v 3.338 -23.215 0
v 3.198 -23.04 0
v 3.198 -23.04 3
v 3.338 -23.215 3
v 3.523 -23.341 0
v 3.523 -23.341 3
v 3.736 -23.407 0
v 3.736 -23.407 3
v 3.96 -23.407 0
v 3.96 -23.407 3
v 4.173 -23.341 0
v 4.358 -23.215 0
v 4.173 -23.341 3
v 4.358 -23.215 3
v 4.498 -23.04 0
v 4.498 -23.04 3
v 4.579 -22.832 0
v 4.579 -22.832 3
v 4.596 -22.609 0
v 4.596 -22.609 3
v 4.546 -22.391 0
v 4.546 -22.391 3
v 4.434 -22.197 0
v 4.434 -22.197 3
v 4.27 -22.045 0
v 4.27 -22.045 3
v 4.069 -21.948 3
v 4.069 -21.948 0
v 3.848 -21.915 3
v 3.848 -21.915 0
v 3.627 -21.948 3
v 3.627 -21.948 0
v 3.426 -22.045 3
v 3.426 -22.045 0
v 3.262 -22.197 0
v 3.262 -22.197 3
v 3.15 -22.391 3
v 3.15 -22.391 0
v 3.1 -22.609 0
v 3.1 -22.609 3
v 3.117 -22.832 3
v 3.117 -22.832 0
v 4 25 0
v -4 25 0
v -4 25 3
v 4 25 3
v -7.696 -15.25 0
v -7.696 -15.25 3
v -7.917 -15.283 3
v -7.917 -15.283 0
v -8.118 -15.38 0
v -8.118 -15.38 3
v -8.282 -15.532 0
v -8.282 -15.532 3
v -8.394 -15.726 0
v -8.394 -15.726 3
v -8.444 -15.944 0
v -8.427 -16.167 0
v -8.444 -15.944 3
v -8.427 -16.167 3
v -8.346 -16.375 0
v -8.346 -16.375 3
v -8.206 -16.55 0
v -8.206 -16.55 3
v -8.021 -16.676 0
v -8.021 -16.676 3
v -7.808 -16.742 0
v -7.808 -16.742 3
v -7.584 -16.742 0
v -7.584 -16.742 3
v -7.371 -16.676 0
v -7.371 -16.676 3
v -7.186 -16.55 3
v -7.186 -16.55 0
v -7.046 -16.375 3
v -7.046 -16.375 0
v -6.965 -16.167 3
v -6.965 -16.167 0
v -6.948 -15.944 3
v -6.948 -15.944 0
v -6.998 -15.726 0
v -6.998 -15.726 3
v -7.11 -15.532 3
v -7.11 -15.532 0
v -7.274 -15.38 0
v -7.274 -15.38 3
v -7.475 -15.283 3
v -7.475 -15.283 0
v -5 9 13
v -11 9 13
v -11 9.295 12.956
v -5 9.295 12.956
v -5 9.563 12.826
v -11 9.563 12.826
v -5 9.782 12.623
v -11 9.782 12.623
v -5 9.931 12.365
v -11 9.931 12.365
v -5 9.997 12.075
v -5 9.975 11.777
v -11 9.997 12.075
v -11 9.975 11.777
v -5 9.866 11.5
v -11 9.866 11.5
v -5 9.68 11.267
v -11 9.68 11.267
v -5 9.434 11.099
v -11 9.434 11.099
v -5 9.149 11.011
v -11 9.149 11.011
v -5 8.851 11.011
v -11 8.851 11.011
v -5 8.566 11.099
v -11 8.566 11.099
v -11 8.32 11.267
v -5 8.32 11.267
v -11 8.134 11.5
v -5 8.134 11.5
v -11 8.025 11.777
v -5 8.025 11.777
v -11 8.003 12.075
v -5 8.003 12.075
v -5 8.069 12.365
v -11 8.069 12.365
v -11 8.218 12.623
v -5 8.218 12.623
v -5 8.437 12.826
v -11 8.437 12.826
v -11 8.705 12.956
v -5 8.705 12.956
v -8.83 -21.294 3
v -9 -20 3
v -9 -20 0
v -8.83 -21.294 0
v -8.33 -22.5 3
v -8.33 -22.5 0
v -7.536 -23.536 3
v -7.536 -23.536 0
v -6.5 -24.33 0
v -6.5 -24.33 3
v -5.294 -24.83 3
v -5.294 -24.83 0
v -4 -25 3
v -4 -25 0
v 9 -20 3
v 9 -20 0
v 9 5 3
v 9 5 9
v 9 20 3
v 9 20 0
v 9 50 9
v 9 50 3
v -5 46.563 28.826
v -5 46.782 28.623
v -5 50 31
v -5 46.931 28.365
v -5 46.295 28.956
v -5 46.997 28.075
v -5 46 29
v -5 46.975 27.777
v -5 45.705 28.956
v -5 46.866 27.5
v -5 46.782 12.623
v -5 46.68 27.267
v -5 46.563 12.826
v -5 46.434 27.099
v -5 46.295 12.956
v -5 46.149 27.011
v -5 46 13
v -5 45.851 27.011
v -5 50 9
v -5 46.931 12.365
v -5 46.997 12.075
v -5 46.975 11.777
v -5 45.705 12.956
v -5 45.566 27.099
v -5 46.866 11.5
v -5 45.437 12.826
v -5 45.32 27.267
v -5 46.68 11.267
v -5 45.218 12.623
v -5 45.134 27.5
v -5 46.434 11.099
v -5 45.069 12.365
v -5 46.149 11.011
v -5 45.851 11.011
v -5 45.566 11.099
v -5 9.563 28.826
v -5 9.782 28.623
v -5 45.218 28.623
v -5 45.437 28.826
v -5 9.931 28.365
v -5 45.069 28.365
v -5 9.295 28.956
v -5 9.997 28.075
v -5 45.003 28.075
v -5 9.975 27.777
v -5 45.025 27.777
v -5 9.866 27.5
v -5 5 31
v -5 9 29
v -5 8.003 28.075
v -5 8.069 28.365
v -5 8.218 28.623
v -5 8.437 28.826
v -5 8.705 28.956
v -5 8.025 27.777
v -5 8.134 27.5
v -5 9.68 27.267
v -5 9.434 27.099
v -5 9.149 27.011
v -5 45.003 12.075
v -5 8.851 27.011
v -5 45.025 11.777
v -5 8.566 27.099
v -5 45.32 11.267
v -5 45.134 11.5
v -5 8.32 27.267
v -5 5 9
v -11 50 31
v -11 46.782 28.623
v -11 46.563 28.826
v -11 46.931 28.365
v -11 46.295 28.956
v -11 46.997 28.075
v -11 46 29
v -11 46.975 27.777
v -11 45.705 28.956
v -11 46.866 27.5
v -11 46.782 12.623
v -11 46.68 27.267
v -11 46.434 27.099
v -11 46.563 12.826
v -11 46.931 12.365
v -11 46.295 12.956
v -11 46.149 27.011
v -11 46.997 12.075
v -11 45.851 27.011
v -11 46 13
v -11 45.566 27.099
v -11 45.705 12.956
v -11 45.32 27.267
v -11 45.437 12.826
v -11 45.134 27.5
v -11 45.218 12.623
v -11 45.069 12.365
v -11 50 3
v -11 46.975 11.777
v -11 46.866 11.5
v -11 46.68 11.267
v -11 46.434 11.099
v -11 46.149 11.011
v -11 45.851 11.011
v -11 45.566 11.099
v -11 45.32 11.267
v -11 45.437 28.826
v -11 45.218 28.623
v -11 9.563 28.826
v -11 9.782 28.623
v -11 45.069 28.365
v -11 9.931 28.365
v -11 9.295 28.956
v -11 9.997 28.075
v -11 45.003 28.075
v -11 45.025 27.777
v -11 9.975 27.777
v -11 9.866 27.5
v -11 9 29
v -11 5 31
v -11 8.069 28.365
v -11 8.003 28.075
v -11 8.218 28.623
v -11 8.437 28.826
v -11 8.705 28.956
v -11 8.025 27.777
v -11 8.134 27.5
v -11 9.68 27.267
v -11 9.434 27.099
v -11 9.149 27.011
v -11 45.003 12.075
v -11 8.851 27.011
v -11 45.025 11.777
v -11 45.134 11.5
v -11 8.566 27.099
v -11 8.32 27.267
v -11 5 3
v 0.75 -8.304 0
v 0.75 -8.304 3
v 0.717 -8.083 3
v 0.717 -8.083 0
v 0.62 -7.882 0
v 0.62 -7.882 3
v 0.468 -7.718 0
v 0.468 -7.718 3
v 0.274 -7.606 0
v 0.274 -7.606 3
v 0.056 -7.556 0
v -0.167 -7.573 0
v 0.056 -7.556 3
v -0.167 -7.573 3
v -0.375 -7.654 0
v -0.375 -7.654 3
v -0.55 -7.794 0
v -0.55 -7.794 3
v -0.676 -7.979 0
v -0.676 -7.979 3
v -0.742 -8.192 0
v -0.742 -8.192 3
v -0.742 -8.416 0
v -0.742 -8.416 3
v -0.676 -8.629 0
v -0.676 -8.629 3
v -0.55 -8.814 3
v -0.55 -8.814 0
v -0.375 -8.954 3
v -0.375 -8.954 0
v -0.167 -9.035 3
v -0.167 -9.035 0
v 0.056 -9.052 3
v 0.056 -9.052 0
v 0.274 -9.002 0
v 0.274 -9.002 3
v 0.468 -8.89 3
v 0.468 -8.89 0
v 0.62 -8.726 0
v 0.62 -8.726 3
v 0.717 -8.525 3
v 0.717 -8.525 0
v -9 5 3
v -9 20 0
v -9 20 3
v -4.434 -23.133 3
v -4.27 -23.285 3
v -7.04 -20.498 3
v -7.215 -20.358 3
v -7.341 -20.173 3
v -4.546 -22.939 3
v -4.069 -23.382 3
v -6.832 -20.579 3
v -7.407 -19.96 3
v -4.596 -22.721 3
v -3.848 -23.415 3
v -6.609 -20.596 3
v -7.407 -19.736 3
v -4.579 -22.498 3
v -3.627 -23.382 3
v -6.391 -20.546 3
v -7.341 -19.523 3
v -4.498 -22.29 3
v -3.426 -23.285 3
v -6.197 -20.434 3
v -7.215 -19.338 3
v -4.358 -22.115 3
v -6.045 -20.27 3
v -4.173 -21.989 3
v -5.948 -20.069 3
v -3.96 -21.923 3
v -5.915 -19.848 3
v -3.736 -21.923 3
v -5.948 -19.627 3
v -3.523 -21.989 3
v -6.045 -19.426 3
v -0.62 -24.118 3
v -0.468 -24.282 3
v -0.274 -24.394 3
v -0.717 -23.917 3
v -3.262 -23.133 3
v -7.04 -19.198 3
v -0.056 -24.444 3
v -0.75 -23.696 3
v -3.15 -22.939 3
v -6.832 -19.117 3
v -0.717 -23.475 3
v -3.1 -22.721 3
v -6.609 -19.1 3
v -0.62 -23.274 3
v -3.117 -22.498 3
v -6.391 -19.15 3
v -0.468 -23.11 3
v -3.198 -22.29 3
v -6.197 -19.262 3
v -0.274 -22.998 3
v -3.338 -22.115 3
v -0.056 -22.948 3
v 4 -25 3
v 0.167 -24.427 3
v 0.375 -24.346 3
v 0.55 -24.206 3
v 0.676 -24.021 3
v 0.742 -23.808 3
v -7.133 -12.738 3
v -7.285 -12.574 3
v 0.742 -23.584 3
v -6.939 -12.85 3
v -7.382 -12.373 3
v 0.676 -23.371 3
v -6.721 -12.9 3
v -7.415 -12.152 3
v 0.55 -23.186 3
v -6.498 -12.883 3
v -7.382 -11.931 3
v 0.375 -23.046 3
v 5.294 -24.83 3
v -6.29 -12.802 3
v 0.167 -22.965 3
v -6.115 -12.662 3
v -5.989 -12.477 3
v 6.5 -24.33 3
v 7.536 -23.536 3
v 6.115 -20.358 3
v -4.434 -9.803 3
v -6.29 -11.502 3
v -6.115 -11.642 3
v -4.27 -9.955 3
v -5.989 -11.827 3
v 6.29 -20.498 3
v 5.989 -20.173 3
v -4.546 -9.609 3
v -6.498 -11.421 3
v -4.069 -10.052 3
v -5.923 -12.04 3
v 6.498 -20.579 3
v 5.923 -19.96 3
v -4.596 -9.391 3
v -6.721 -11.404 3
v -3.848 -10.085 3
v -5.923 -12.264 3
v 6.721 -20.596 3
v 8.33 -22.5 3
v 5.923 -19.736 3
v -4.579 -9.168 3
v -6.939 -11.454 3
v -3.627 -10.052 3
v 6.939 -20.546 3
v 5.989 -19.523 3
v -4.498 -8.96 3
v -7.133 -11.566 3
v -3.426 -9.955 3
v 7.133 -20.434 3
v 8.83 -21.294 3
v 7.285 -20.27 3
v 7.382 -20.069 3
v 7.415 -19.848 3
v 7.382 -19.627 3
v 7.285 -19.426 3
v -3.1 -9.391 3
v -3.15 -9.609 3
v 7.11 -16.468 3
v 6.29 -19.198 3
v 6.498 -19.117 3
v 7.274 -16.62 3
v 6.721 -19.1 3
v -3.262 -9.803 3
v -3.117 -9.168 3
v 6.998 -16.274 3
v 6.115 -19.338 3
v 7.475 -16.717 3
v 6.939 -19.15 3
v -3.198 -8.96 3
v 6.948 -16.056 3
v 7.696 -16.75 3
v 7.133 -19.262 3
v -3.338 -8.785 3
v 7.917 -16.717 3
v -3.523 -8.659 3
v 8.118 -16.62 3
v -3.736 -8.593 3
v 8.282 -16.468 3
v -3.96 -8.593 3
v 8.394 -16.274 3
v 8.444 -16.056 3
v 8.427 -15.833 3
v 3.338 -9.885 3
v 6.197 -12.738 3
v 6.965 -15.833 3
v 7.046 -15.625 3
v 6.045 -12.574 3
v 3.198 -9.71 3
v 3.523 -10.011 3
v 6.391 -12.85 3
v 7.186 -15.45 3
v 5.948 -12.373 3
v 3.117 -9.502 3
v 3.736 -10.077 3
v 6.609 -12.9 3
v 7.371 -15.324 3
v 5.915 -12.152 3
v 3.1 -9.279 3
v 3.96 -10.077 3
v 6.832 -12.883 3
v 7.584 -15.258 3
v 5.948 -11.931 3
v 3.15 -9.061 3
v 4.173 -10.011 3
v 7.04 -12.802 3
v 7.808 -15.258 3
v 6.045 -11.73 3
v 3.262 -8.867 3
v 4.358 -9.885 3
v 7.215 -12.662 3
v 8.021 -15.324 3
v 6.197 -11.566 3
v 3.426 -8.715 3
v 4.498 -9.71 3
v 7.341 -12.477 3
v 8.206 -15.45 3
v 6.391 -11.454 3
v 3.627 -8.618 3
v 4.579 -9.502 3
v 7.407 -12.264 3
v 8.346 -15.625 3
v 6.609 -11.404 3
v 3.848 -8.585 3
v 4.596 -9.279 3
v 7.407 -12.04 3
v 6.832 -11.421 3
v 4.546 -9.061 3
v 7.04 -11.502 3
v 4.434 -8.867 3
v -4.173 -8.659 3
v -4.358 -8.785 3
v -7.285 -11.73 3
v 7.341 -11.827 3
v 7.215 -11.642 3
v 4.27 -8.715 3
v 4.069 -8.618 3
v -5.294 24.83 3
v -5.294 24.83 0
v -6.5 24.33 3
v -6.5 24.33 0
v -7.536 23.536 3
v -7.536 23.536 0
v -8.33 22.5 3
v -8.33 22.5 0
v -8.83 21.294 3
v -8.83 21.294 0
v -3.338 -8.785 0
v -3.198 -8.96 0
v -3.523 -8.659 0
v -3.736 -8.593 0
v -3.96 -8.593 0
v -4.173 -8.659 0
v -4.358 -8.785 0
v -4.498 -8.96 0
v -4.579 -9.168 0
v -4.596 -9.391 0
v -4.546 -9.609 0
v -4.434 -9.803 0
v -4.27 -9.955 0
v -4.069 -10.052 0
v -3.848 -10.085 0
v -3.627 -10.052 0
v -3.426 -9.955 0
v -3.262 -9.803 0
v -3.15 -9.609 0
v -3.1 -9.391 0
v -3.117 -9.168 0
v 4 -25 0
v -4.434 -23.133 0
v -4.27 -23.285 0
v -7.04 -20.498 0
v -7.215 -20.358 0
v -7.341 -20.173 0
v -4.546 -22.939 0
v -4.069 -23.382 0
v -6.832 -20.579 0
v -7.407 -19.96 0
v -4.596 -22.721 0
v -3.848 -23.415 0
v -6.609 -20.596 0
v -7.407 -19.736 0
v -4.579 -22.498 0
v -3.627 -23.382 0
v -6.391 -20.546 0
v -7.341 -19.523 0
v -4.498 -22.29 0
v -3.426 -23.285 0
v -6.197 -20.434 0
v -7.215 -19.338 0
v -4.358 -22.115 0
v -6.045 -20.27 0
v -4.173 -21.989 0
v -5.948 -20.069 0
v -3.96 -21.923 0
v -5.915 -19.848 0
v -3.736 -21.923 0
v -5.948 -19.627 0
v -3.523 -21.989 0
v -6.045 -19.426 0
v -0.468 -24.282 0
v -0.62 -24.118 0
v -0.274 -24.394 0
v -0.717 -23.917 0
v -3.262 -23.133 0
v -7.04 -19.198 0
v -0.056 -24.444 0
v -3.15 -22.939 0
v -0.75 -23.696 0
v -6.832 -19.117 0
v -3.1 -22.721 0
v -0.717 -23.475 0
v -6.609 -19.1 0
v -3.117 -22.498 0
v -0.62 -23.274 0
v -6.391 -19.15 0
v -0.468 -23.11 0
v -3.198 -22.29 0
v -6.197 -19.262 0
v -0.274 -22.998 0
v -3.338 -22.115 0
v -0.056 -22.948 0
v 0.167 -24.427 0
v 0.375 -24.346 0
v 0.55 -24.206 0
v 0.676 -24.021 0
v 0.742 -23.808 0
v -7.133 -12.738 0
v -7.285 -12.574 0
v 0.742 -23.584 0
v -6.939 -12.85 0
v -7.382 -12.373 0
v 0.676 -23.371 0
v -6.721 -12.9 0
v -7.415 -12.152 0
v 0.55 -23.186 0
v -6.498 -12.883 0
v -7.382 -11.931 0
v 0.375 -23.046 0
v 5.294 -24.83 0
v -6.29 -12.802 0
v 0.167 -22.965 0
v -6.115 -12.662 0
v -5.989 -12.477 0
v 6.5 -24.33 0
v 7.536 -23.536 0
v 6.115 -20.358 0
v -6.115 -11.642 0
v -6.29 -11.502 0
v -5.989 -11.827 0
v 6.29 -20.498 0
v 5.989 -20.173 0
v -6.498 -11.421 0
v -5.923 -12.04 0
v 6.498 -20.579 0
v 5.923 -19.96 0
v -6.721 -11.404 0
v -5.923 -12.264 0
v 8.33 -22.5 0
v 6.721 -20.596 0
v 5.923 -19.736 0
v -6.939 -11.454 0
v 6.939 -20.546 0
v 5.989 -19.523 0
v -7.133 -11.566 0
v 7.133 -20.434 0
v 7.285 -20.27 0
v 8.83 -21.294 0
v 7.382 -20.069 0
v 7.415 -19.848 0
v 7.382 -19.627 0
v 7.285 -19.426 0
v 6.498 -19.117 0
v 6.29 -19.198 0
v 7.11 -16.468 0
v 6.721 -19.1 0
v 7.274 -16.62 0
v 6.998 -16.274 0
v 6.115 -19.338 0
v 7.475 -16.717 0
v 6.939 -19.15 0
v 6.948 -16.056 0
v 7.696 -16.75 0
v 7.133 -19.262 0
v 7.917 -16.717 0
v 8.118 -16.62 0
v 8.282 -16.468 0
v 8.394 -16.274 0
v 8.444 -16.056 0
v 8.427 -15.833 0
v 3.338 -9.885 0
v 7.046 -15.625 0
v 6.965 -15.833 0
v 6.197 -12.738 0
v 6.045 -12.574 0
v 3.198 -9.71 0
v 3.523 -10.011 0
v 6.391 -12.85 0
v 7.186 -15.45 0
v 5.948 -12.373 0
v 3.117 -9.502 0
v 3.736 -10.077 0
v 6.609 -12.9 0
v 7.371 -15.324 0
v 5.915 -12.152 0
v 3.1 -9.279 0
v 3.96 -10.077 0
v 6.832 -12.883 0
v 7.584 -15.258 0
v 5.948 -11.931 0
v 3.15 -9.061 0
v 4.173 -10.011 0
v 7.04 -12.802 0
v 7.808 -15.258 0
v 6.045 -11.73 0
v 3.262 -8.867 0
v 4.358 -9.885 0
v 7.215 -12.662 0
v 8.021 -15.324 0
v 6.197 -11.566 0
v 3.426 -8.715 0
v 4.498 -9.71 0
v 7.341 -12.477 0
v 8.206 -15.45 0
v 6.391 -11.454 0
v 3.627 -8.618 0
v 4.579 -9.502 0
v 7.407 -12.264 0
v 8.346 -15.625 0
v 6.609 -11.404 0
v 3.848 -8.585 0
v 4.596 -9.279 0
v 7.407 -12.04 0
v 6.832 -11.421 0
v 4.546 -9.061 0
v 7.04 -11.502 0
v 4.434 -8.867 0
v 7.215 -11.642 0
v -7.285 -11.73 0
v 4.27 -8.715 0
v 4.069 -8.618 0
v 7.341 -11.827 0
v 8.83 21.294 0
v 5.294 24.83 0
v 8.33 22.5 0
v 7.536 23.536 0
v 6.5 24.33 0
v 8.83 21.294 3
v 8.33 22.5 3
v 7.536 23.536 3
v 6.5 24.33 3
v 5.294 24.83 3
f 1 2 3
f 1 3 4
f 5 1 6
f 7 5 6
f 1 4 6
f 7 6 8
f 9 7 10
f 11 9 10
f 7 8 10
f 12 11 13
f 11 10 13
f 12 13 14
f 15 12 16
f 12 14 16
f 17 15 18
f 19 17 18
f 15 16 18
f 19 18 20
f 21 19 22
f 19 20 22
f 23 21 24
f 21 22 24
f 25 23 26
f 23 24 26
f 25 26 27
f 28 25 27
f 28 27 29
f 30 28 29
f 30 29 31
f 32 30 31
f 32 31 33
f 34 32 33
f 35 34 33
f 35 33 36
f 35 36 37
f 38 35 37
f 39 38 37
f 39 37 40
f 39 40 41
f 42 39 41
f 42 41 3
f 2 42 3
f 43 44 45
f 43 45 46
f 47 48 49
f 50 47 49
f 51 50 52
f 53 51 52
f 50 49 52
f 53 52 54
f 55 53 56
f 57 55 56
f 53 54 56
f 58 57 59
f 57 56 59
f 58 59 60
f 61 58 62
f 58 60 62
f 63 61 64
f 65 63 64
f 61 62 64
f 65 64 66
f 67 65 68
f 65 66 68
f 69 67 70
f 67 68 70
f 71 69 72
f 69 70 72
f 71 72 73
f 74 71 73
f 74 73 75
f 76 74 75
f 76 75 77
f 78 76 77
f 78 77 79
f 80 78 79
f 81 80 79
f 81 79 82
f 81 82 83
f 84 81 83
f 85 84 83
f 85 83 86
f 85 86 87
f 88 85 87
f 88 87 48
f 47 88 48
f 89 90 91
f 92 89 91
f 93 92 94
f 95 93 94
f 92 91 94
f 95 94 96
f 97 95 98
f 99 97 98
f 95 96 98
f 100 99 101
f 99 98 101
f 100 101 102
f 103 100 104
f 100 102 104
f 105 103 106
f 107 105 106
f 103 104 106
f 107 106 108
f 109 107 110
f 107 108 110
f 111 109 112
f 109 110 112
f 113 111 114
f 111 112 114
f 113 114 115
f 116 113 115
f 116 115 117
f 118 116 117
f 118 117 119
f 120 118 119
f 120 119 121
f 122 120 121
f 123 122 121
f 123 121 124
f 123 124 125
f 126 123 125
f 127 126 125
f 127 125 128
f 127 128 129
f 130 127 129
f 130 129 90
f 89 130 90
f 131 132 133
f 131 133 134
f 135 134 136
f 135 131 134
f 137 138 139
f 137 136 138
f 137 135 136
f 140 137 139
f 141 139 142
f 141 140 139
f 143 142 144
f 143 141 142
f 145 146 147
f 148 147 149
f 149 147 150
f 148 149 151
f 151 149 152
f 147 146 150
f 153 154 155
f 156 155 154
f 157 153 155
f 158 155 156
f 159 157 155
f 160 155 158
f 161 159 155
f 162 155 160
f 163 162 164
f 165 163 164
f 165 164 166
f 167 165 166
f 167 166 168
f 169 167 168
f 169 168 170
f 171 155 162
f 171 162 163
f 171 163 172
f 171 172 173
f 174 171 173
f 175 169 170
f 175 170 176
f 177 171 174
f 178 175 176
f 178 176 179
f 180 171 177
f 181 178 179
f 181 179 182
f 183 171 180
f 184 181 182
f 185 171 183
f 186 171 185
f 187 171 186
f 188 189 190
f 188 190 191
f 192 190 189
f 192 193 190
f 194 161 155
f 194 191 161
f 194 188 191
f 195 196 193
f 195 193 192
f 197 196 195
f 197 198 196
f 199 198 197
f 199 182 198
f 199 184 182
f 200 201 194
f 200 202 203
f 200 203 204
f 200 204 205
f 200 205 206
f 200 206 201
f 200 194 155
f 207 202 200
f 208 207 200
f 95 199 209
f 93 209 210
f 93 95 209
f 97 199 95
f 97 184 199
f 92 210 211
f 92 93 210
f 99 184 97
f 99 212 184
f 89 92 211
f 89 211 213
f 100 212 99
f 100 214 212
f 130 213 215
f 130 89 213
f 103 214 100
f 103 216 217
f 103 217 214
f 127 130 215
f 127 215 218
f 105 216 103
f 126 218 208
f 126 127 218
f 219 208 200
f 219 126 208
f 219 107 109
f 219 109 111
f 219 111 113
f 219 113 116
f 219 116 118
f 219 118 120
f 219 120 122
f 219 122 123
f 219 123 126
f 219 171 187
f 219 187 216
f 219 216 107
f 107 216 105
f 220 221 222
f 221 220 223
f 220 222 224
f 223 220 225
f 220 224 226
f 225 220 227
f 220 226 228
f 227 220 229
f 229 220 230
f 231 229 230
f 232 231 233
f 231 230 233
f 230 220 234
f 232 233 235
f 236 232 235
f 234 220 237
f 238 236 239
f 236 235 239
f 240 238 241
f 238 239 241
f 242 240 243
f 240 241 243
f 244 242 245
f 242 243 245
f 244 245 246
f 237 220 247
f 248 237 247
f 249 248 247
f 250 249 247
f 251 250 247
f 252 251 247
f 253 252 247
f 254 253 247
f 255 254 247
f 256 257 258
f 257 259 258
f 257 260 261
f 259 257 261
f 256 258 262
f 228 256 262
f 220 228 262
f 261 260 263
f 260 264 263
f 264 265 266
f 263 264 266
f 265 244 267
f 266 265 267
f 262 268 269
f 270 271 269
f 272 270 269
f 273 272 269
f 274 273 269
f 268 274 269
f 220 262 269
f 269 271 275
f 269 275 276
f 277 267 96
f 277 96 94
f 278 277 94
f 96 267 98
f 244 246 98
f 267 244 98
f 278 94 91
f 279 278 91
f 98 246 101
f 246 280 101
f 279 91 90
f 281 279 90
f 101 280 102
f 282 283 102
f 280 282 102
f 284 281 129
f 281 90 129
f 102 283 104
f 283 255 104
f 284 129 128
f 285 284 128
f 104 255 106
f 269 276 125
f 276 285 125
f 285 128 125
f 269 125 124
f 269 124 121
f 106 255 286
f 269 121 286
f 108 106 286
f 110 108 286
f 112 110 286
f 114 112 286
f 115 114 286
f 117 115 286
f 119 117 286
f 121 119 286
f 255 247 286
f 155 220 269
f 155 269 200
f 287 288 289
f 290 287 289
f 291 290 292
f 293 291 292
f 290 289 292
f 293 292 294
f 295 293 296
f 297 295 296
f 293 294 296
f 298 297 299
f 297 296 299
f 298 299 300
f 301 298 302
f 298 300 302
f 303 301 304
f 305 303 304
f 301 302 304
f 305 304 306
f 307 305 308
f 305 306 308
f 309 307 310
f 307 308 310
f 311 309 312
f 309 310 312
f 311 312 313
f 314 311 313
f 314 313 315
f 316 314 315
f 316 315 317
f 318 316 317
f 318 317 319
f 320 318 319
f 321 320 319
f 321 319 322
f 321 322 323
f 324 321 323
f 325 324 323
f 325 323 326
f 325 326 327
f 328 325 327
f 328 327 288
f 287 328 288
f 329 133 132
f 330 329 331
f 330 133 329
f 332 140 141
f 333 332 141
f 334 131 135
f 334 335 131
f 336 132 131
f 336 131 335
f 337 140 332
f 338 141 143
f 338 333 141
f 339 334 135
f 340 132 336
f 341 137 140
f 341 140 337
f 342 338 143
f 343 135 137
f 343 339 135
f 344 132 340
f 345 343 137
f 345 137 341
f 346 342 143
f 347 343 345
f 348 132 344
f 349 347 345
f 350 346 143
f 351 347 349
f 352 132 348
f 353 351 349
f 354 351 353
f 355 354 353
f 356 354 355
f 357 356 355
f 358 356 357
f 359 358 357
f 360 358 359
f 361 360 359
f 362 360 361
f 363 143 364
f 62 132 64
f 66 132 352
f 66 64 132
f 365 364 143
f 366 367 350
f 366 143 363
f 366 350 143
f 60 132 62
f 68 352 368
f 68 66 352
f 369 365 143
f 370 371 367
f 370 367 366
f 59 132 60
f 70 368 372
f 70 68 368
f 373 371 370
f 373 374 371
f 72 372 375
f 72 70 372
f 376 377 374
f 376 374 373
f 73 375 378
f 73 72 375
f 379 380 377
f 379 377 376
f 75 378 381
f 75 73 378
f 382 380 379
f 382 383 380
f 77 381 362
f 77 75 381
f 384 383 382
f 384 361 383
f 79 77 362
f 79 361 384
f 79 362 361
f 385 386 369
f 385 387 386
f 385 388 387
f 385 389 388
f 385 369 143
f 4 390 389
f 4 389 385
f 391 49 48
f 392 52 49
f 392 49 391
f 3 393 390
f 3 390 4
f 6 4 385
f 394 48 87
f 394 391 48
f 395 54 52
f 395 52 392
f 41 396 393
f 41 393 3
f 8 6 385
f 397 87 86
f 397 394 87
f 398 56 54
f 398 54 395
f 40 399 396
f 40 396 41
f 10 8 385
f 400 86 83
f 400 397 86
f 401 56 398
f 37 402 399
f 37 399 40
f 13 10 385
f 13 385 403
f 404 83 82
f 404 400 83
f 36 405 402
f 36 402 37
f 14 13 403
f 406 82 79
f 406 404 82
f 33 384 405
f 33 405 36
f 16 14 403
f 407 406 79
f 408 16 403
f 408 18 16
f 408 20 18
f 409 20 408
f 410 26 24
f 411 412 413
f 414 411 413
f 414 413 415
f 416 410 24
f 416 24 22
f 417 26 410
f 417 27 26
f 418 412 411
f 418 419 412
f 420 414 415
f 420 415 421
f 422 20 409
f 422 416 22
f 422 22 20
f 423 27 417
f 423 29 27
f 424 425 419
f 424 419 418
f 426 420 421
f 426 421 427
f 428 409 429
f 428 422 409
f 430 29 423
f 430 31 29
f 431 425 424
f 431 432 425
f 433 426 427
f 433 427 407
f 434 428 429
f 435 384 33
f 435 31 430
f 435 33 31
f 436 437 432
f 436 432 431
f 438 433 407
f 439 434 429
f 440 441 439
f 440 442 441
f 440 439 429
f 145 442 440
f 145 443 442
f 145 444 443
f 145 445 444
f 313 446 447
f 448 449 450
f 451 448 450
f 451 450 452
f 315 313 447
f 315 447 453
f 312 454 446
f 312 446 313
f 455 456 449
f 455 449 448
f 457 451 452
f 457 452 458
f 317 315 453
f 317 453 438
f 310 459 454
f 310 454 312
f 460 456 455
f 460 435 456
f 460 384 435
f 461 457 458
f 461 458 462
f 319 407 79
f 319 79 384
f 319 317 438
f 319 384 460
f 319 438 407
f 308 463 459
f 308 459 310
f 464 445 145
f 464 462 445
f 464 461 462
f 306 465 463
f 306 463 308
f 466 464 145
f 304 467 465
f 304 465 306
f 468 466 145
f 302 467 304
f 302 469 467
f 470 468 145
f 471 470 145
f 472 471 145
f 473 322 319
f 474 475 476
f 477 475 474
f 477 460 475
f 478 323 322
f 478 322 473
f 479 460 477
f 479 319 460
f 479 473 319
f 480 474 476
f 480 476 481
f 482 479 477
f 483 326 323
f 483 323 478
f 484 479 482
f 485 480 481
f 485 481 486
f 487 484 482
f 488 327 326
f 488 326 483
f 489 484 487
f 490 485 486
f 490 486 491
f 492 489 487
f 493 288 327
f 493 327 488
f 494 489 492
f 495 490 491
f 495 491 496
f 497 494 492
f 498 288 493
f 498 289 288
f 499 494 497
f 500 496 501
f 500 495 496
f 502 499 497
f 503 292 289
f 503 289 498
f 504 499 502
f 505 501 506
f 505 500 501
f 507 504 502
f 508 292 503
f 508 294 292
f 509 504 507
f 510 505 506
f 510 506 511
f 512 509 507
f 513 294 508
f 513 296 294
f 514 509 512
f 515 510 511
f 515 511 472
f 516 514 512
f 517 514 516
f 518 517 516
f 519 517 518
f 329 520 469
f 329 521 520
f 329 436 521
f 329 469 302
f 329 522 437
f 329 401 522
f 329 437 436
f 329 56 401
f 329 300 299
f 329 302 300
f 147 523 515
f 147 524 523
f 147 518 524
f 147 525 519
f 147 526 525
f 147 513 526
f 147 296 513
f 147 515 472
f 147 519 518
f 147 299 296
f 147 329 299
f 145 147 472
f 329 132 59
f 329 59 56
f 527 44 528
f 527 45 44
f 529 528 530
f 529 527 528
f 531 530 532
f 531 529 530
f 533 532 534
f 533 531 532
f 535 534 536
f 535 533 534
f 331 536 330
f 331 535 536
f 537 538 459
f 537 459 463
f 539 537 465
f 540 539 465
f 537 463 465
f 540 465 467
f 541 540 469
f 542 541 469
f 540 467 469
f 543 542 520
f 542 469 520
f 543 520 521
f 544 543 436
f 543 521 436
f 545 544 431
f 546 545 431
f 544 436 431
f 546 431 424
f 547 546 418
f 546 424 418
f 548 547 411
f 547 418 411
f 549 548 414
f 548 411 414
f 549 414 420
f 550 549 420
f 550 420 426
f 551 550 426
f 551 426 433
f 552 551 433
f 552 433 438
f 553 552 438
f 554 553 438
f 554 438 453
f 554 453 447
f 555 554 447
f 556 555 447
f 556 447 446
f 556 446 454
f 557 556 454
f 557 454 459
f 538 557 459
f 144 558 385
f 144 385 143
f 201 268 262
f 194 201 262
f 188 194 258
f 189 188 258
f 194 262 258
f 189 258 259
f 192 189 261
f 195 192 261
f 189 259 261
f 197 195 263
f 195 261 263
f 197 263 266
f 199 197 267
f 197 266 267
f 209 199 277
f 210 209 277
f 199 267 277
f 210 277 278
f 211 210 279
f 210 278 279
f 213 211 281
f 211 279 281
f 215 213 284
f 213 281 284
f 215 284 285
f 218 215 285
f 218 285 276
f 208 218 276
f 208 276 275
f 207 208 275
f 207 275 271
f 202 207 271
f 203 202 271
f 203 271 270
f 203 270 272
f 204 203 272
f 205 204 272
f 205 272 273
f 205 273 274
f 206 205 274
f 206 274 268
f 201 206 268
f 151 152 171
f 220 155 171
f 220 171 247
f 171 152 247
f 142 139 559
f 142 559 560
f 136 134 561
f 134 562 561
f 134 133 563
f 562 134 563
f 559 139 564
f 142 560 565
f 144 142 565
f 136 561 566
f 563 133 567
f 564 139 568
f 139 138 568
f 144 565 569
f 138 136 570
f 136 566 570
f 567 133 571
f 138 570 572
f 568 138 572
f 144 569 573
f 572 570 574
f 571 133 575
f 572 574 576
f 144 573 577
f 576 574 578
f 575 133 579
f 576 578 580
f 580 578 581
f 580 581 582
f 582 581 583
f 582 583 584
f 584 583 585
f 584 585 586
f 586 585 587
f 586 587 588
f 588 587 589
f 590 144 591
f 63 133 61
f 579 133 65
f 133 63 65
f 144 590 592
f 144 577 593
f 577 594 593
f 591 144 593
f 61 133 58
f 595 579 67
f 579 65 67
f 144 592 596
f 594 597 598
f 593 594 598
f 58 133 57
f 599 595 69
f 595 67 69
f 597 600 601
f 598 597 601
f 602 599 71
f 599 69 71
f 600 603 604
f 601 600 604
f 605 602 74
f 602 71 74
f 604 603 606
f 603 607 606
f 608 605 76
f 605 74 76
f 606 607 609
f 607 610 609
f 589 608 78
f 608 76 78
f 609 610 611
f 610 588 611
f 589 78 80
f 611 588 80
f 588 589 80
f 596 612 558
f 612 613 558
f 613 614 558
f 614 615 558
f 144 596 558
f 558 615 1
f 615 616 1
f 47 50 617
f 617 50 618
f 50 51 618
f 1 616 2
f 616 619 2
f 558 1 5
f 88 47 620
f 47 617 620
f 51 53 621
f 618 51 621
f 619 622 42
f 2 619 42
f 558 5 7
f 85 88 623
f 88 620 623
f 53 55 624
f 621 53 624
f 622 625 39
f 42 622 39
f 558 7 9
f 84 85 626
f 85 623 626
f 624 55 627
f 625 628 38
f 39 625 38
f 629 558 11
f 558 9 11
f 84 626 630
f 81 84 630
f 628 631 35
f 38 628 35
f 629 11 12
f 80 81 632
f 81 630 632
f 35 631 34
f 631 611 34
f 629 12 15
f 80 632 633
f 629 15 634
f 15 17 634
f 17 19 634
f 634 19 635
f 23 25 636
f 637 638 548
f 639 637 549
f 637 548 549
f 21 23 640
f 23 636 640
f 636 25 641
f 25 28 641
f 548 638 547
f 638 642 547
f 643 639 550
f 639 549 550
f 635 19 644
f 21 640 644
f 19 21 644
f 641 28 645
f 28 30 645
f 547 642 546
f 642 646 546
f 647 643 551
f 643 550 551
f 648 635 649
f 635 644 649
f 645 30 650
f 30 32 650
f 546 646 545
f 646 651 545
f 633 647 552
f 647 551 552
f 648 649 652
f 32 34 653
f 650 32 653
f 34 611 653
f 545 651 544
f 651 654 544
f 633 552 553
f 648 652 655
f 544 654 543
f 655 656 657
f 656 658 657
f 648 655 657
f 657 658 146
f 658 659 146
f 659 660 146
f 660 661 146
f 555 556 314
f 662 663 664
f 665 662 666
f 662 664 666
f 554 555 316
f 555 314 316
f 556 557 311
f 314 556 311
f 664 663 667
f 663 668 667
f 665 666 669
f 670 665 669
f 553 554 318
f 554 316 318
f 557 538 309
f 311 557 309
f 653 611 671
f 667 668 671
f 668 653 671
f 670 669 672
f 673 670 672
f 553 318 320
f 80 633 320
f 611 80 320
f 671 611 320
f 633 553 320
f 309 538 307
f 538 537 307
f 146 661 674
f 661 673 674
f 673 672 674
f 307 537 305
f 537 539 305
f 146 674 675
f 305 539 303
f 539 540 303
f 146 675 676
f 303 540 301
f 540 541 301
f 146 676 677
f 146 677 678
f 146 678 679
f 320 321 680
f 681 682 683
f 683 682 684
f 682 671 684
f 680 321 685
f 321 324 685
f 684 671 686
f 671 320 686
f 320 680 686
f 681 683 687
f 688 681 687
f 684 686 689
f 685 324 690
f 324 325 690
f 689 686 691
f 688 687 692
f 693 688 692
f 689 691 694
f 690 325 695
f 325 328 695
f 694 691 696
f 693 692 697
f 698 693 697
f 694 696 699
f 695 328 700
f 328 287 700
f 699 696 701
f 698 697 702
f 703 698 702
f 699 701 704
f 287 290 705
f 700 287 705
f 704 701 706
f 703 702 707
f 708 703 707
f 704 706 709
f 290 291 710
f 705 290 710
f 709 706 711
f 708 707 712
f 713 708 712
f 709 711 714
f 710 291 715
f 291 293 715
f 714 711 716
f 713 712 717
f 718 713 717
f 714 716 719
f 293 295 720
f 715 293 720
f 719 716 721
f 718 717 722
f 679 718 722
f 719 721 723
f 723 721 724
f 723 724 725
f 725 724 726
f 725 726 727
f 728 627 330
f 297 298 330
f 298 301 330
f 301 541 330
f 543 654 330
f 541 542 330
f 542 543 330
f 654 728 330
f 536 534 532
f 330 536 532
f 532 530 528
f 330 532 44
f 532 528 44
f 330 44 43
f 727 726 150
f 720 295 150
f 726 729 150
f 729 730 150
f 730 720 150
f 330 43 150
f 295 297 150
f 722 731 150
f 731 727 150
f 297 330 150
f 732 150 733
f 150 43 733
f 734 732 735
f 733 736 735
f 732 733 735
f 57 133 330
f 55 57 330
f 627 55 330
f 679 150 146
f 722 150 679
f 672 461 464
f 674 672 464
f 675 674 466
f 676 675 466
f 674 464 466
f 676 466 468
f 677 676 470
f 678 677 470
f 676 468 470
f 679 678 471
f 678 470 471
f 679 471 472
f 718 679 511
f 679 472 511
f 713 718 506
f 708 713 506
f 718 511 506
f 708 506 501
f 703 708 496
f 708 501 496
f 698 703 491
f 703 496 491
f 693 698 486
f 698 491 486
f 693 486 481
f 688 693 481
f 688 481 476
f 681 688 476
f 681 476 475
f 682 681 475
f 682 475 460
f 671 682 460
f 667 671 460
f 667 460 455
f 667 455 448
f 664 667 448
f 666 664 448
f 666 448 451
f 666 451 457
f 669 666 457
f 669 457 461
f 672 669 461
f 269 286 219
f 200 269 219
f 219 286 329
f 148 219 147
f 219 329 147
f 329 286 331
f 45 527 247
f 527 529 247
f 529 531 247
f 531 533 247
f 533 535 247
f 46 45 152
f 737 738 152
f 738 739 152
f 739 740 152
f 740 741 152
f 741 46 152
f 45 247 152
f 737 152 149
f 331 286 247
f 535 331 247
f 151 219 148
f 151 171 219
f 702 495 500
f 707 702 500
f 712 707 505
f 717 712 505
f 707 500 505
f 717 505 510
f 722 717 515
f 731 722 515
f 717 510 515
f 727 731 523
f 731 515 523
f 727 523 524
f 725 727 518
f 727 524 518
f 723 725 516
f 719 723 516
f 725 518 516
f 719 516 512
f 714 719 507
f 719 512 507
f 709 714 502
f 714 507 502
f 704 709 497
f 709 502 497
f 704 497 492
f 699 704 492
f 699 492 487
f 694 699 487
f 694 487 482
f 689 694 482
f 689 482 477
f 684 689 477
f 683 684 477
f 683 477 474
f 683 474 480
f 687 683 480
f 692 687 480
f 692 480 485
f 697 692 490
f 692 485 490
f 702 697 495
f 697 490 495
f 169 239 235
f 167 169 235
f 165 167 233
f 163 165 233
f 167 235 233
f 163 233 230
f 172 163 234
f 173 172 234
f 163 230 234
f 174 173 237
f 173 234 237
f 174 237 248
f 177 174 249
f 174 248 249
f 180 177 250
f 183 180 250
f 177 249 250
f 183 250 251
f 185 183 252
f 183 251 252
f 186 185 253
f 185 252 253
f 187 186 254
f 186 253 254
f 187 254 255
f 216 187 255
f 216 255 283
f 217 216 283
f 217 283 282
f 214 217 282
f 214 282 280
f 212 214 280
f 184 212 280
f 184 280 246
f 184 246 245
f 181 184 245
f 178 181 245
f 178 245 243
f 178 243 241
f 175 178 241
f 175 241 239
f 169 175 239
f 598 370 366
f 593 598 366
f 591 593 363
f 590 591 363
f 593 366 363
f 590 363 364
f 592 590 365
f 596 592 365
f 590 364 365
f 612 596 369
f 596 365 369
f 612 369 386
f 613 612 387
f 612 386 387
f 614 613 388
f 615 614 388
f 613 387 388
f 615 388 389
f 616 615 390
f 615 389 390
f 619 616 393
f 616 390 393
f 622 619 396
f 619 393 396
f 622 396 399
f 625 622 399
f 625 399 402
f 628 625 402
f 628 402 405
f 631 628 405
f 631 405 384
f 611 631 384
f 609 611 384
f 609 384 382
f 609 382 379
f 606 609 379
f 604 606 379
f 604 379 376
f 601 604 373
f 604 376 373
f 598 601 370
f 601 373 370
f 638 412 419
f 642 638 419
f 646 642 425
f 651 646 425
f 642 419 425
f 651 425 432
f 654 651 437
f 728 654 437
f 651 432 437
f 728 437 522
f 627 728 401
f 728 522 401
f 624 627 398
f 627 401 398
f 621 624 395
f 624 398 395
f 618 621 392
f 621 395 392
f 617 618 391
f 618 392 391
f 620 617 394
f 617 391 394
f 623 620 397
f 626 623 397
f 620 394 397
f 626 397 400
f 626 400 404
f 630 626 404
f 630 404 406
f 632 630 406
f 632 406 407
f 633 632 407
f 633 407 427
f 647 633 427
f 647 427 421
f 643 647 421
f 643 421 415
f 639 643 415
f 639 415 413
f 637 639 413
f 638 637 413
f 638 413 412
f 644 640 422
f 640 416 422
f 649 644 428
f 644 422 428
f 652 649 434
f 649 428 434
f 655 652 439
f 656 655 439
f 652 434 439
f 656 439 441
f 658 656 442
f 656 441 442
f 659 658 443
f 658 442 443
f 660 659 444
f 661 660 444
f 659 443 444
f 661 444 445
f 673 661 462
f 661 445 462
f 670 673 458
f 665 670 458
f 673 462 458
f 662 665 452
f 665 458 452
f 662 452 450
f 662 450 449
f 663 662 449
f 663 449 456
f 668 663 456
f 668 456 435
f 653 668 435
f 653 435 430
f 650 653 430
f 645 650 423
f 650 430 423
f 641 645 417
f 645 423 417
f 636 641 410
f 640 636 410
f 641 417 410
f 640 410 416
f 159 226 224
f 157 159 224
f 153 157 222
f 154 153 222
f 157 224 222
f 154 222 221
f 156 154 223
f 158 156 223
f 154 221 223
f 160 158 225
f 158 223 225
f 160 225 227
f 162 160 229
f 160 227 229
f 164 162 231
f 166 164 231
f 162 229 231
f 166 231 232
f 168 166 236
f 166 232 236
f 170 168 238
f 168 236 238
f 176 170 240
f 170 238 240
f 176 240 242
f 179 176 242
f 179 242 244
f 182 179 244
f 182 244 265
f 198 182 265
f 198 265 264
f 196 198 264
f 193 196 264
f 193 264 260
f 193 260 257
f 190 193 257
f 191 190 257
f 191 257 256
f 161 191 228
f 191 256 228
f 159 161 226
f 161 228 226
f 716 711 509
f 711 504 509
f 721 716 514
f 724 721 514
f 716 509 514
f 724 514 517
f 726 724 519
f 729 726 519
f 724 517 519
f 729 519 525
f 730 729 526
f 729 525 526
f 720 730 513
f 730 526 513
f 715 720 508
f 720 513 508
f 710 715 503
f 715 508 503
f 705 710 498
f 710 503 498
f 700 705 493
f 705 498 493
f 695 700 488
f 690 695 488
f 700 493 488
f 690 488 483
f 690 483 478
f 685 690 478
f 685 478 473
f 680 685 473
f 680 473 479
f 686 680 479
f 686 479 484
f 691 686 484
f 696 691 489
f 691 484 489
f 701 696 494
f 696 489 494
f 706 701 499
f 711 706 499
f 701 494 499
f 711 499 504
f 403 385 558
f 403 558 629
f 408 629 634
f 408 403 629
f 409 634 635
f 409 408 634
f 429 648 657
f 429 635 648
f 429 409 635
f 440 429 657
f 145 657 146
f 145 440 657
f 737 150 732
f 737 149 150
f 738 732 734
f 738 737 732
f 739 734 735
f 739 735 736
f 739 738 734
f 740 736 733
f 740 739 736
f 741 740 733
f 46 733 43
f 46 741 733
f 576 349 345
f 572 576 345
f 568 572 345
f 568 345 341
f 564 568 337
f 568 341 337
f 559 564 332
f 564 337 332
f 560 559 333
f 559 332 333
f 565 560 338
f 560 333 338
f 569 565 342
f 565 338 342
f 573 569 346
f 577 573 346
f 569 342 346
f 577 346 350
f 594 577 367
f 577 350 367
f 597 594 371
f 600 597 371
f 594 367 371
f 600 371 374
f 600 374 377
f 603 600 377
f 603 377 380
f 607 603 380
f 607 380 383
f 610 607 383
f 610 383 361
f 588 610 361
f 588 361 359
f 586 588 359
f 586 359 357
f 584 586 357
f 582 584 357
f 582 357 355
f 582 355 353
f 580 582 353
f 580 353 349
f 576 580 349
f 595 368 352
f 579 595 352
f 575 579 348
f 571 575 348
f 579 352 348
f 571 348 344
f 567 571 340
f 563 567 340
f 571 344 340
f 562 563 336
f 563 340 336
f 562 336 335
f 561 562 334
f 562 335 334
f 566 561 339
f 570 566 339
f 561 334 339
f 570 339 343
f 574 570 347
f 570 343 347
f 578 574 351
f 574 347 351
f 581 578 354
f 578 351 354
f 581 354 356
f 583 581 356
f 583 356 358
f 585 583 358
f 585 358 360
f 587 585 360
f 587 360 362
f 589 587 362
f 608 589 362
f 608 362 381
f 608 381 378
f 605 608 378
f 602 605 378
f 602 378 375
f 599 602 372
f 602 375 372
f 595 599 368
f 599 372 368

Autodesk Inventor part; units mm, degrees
ref_plane "YZ Plane" through (0, 0, 0) normal (1, 0, 0) x (0, 1, 0)
ref_plane "XZ Plane" through (0, 0, 0) normal (0, 1, 0) x (-1, 0, 0)
ref_plane "XY Plane" through (0, 0, 0) normal (0, 0, 1) x (1, 0, 0)
sketch "Sketch1" plane through (0, 0, 0) normal (0, 0, 1) x (1, 0, 0)
  line L0 (-9, 25) -> (9, 25)
  line L1 (9, 25) -> (9, -25)
  line L2 (9, -25) -> (-9, -25)
  line L3 (-9, -25) -> (-9, 25)
  point P0 (0, 0)
  point P1 (0, 25)
  point P2 (-9, 0)
  dimension "d0" = 18
  dimension "d1" = 50
extrude "Extrusion1" add sketch "Sketch1" along normal blind 3
fillet "Fillet1" radius 5 2 edges at (-9, -25, 1.5) (9, -25, 1.5)
fillet "Fillet2" radius 5 2 edges at (-9, 25, 1.5) (9, 25, 1.5)
sketch "Sketch2" plane through (0, 0, 3) normal (0, 0, 1) x (1, 0, 0)
  circle A0 centre (0, -16) radius 9
  circle A1 centre (0, 16) radius 9
  line L0 (-4, -25) -> (4, -25) projected
  circle A2 centre (0, -8.304) radius 0.75
  line L1 (4, 25) -> (-4, 25) projected
  point P0 (0, 0)
  dimension "d6" = 18
  dimension "d8" = 1.5
  dimension "d10" = 18
extrude "Extrusion2" cut sketch "Sketch2" against normal up to surface (3 mm away) contours A2
pattern_circular "Circular Pattern1" count 12 over 360 about axis through (0, -16, 3) along (0, 0, 1) of "Extrusion2"
sketch "Sketch4" plane through (0, 0, 3) normal (0, 0, 1) x (1, 0, 0)
  line L0 (-11, 5) -> (9, 5)
  line L1 (9, 5) -> (9, 50)
  line L2 (9, 50) -> (-11, 50)
  line L3 (-11, 50) -> (-11, 5)
  line L4 (-9, 20) -> (-9, -20) projected
  line L5 (4, 25) -> (-4, 25) projected
  line L6 (9, -20) -> (9, 20) projected
  point P0 (0, 0)
  dimension "d25" = 20
  dimension "d26" = 45
  dimension "d27" = 20
extrude "Extrusion5" add sketch "Sketch4" along normal blind 6
sketch "Sketch5" plane through (0, 0, 3) normal (0, 0, 1) x (1, 0, 0)
  line L0 (9, 50) -> (-11, 50) projected
  line L1 (-5, 5) -> (-11, 5)
  line L2 (-11, 5) -> (-11, 50)
  line L3 (-11, 50) -> (-5, 50)
  line L4 (-5, 50) -> (-5, 5)
  line L5 (-11, 50) -> (-11, 5) projected
  point P0 (0, 0)
  dimension "d30" = 6
extrude "Extrusion6" add sketch "Sketch5" along normal blind 28
sketch "Sketch6" plane through (-11, 5, 3) normal (-1, 0, 0) x (0, 0, 1)
  circle A0 centre (25, 4) radius 1
  circle A1 centre (9, 4) radius 1
  circle A2 centre (25, 41) radius 1
  circle A3 centre (9, 41) radius 1
  line L0 (0, 0) -> (28, 0) projected
  line L1 (25, 4) -> (25, 41) construction
  line L2 (28, 45) -> (28, 0) projected
  point P0 (-3, -5)
  point P1 (28, 22.5)
  point P2 (25, 22.5)
  point P3 (6, 0)
  dimension "d33" = 2
  dimension "d34" = 2
  dimension "d35" = 2
  dimension "d36" = 2
  dimension "d37" = 37
  dimension "d38" = 16
  dimension "d40" = 16
  dimension "d43" = 3
extrude "Extrusion7" cut sketch "Sketch6" against normal up to surface (20 mm away)
properties part number "first_man_link"
